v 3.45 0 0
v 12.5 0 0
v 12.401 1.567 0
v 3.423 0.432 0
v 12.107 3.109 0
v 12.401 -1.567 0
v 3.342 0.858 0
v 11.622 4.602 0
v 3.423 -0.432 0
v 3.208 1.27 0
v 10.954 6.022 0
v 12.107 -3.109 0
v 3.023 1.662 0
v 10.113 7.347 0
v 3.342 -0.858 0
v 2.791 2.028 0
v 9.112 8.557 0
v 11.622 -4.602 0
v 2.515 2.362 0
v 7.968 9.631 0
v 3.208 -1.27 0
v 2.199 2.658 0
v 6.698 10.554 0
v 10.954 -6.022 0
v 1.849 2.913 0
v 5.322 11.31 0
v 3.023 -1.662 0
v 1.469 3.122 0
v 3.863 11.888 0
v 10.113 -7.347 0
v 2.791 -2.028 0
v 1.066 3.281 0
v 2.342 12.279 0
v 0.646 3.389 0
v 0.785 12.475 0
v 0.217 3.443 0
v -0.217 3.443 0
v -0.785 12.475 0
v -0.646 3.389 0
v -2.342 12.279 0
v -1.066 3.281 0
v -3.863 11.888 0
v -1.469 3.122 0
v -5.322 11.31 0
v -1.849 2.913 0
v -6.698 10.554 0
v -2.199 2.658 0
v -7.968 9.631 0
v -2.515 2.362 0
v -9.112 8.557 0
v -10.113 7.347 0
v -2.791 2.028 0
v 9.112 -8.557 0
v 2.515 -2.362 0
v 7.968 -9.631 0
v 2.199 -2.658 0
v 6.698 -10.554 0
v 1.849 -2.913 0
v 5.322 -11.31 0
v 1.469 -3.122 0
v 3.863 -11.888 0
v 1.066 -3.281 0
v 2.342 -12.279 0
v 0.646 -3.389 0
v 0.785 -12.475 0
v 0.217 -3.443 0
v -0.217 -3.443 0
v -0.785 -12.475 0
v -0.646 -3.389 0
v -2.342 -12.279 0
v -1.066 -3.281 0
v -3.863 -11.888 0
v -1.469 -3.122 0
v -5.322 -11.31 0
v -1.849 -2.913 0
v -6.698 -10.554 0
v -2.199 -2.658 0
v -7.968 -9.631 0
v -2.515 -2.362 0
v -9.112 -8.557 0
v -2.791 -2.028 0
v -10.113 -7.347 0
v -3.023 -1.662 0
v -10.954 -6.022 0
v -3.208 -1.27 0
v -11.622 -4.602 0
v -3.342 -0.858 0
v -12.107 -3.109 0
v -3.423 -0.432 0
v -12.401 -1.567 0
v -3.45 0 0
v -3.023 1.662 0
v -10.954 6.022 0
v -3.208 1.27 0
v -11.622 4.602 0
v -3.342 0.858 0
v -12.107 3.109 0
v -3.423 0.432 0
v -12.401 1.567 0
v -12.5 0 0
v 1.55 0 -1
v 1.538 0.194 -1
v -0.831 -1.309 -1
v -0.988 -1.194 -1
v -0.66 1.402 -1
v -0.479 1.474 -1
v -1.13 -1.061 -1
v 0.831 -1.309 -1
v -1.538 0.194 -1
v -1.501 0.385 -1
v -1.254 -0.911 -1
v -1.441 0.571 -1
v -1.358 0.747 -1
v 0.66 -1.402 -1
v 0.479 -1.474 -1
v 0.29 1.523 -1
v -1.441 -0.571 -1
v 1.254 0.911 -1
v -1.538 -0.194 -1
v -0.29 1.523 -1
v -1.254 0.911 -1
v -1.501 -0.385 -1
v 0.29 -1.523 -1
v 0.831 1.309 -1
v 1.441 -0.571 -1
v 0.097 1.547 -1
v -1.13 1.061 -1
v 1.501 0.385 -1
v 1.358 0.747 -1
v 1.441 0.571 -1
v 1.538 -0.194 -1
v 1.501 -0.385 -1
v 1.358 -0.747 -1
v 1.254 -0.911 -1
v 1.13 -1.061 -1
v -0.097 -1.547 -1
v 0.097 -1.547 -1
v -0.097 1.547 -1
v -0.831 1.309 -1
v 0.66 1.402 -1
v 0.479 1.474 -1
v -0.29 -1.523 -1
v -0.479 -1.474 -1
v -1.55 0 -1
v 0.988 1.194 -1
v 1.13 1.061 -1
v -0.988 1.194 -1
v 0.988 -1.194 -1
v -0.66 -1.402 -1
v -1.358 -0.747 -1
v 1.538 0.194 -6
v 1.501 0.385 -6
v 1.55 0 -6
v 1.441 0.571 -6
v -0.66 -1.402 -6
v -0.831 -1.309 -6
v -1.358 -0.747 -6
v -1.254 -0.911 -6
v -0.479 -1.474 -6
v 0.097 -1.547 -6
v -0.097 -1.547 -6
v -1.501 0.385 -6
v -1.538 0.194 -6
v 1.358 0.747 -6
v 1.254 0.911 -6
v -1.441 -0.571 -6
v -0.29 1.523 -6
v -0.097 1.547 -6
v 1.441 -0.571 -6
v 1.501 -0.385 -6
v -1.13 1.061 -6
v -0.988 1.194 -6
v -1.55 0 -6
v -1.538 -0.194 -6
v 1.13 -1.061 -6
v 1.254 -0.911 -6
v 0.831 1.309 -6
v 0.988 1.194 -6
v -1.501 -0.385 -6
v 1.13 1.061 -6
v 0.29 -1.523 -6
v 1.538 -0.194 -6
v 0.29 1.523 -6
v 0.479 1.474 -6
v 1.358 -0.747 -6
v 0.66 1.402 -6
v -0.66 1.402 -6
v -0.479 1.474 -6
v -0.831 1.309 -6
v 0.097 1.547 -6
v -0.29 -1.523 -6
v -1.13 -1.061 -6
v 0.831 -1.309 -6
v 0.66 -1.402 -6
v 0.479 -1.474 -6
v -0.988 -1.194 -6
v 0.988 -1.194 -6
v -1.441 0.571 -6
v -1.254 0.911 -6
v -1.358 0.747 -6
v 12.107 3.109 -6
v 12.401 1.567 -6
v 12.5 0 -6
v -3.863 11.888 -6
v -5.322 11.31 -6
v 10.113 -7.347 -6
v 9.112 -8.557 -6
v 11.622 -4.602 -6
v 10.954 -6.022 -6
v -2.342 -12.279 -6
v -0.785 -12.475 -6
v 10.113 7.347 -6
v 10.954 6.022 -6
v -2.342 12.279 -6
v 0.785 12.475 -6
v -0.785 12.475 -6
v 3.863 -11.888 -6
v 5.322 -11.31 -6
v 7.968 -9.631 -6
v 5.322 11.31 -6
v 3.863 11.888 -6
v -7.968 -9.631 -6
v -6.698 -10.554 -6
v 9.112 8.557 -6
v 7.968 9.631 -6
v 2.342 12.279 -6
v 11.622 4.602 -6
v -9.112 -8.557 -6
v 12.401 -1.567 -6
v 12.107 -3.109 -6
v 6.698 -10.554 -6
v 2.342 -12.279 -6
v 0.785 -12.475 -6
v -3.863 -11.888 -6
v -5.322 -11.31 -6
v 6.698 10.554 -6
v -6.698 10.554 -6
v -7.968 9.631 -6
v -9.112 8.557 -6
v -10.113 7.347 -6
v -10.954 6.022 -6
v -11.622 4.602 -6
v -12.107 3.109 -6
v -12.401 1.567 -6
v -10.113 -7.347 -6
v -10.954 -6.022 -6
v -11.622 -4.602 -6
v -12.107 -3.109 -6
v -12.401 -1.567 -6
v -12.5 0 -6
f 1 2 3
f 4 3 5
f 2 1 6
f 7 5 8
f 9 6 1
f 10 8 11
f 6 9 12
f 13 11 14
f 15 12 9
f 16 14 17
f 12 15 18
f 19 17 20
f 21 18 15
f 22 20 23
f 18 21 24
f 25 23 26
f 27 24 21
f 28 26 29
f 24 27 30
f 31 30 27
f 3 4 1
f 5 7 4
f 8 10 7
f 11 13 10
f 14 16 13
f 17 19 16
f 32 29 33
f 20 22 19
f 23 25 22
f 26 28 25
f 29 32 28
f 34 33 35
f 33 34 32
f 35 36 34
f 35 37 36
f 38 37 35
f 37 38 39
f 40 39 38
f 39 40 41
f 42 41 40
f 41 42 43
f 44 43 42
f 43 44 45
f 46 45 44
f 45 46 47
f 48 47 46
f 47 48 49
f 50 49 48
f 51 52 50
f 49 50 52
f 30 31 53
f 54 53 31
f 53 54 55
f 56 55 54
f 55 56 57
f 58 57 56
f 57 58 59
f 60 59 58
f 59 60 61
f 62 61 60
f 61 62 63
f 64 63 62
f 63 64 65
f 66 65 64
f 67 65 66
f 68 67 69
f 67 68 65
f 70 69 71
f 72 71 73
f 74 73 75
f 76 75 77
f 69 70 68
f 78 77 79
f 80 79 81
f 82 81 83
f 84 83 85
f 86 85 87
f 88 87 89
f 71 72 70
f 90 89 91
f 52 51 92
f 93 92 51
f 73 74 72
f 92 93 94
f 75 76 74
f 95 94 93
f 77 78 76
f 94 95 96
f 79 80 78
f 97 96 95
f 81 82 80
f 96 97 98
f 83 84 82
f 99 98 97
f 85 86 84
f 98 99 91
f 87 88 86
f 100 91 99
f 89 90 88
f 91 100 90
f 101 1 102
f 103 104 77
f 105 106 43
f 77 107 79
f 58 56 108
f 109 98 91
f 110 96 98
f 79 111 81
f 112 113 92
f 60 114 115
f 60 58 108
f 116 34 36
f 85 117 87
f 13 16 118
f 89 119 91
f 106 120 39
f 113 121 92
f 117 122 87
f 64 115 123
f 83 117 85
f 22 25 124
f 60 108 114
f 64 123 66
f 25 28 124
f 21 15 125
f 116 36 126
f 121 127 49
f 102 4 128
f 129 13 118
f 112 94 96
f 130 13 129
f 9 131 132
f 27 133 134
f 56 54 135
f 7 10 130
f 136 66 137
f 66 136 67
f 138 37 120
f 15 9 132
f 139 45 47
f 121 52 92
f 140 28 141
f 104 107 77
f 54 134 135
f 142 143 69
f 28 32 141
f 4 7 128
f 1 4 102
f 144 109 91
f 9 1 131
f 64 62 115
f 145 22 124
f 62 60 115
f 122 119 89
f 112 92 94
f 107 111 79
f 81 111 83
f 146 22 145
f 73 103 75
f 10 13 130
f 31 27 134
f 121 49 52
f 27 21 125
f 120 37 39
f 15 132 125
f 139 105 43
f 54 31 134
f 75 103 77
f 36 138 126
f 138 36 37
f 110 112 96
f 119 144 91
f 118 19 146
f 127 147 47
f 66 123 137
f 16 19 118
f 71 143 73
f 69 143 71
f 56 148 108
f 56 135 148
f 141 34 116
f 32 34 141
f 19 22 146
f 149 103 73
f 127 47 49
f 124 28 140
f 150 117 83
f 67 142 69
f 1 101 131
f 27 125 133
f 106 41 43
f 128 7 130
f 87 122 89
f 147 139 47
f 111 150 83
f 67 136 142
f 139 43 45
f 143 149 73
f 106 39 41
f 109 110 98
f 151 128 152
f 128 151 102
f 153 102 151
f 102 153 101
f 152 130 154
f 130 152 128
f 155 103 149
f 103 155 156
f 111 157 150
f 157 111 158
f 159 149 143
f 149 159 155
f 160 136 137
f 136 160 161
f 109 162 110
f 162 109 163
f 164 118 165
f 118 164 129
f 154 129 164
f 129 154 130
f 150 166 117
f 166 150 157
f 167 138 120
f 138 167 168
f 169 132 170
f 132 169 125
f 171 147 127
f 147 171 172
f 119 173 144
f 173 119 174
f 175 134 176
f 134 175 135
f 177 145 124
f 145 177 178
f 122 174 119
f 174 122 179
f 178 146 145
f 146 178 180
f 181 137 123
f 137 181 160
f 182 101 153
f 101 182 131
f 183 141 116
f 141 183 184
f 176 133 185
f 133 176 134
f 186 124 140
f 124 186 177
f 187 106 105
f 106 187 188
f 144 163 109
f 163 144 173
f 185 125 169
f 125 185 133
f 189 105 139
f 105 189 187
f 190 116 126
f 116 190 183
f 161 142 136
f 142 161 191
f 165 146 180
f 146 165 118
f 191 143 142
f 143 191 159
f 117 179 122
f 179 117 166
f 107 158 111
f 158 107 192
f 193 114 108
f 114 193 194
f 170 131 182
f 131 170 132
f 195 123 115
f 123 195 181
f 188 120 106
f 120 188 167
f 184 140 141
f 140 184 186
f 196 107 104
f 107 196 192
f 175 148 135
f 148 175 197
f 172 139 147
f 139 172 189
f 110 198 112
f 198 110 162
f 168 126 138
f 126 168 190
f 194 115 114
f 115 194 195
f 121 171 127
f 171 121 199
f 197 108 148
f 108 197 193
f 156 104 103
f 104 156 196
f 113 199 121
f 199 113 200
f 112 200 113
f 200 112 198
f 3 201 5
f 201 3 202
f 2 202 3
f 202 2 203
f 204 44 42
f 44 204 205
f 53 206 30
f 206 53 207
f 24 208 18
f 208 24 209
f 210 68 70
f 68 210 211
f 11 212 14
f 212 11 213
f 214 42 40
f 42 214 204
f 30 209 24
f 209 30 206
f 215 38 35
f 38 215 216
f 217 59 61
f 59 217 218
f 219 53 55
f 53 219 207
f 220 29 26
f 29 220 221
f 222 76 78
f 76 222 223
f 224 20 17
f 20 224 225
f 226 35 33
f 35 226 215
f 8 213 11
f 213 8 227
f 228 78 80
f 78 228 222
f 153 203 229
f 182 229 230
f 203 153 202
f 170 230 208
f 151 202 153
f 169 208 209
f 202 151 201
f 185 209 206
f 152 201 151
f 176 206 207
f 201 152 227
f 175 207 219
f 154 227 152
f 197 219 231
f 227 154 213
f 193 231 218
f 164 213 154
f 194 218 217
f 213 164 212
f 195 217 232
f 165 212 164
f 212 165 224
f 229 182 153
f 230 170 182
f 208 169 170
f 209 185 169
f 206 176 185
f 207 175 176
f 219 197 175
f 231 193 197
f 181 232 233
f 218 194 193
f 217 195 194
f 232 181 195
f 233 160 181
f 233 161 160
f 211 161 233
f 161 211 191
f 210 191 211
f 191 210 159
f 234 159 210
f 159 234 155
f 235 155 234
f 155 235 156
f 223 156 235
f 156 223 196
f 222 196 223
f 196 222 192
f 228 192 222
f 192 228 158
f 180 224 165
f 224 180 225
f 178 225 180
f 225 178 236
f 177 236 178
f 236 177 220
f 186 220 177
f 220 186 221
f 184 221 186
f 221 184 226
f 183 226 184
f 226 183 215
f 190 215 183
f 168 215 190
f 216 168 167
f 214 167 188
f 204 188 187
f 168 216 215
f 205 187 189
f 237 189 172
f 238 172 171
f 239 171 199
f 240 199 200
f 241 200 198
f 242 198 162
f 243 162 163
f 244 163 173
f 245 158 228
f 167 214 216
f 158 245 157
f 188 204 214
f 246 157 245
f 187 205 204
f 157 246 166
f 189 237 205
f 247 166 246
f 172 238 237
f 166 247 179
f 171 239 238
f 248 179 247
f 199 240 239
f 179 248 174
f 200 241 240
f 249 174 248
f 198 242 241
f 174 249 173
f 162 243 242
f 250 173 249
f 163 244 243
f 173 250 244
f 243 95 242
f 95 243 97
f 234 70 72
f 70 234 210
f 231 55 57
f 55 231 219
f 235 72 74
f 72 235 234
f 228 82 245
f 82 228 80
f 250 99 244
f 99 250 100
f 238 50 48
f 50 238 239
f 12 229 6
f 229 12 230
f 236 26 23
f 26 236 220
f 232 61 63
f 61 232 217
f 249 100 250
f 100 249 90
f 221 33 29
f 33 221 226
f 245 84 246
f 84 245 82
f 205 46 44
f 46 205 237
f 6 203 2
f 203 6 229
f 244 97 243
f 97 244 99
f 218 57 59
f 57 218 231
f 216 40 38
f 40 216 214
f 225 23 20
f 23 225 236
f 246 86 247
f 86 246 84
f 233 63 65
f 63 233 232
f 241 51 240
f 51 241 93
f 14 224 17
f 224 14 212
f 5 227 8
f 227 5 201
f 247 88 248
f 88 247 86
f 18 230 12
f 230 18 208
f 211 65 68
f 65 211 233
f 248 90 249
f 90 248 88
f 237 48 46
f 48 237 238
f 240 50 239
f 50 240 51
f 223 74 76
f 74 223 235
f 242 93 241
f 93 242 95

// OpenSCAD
$fn = 50;

difference() {
	union() {
		translate(v = [0, 0, -6.0]) {
			cylinder(h = 6, r = 12.5);
		}
	}
	union() {
		translate(v = [0, 0, 0]) {
			rotate(a = [0, 0, 0]) {
				difference() {
					union() {
						translate(v = [0, 0, -9.0]) {
							cylinder(h = 9, r = 1.25);
						}
						translate(v = [0, 0, -1.0]) {
							cylinder(h = 1.0, r1 = 1.55, r2 = 3.45);
						}
						translate(v = [0, 0, -9.0]) {
							cylinder(h = 9, r = 1.55);
						}
						translate(v = [0, 0, -9.0]) {
							cylinder(h = 9, r = 1.25);
						}
					}
					union();
				}
			}
		}
	}
}
